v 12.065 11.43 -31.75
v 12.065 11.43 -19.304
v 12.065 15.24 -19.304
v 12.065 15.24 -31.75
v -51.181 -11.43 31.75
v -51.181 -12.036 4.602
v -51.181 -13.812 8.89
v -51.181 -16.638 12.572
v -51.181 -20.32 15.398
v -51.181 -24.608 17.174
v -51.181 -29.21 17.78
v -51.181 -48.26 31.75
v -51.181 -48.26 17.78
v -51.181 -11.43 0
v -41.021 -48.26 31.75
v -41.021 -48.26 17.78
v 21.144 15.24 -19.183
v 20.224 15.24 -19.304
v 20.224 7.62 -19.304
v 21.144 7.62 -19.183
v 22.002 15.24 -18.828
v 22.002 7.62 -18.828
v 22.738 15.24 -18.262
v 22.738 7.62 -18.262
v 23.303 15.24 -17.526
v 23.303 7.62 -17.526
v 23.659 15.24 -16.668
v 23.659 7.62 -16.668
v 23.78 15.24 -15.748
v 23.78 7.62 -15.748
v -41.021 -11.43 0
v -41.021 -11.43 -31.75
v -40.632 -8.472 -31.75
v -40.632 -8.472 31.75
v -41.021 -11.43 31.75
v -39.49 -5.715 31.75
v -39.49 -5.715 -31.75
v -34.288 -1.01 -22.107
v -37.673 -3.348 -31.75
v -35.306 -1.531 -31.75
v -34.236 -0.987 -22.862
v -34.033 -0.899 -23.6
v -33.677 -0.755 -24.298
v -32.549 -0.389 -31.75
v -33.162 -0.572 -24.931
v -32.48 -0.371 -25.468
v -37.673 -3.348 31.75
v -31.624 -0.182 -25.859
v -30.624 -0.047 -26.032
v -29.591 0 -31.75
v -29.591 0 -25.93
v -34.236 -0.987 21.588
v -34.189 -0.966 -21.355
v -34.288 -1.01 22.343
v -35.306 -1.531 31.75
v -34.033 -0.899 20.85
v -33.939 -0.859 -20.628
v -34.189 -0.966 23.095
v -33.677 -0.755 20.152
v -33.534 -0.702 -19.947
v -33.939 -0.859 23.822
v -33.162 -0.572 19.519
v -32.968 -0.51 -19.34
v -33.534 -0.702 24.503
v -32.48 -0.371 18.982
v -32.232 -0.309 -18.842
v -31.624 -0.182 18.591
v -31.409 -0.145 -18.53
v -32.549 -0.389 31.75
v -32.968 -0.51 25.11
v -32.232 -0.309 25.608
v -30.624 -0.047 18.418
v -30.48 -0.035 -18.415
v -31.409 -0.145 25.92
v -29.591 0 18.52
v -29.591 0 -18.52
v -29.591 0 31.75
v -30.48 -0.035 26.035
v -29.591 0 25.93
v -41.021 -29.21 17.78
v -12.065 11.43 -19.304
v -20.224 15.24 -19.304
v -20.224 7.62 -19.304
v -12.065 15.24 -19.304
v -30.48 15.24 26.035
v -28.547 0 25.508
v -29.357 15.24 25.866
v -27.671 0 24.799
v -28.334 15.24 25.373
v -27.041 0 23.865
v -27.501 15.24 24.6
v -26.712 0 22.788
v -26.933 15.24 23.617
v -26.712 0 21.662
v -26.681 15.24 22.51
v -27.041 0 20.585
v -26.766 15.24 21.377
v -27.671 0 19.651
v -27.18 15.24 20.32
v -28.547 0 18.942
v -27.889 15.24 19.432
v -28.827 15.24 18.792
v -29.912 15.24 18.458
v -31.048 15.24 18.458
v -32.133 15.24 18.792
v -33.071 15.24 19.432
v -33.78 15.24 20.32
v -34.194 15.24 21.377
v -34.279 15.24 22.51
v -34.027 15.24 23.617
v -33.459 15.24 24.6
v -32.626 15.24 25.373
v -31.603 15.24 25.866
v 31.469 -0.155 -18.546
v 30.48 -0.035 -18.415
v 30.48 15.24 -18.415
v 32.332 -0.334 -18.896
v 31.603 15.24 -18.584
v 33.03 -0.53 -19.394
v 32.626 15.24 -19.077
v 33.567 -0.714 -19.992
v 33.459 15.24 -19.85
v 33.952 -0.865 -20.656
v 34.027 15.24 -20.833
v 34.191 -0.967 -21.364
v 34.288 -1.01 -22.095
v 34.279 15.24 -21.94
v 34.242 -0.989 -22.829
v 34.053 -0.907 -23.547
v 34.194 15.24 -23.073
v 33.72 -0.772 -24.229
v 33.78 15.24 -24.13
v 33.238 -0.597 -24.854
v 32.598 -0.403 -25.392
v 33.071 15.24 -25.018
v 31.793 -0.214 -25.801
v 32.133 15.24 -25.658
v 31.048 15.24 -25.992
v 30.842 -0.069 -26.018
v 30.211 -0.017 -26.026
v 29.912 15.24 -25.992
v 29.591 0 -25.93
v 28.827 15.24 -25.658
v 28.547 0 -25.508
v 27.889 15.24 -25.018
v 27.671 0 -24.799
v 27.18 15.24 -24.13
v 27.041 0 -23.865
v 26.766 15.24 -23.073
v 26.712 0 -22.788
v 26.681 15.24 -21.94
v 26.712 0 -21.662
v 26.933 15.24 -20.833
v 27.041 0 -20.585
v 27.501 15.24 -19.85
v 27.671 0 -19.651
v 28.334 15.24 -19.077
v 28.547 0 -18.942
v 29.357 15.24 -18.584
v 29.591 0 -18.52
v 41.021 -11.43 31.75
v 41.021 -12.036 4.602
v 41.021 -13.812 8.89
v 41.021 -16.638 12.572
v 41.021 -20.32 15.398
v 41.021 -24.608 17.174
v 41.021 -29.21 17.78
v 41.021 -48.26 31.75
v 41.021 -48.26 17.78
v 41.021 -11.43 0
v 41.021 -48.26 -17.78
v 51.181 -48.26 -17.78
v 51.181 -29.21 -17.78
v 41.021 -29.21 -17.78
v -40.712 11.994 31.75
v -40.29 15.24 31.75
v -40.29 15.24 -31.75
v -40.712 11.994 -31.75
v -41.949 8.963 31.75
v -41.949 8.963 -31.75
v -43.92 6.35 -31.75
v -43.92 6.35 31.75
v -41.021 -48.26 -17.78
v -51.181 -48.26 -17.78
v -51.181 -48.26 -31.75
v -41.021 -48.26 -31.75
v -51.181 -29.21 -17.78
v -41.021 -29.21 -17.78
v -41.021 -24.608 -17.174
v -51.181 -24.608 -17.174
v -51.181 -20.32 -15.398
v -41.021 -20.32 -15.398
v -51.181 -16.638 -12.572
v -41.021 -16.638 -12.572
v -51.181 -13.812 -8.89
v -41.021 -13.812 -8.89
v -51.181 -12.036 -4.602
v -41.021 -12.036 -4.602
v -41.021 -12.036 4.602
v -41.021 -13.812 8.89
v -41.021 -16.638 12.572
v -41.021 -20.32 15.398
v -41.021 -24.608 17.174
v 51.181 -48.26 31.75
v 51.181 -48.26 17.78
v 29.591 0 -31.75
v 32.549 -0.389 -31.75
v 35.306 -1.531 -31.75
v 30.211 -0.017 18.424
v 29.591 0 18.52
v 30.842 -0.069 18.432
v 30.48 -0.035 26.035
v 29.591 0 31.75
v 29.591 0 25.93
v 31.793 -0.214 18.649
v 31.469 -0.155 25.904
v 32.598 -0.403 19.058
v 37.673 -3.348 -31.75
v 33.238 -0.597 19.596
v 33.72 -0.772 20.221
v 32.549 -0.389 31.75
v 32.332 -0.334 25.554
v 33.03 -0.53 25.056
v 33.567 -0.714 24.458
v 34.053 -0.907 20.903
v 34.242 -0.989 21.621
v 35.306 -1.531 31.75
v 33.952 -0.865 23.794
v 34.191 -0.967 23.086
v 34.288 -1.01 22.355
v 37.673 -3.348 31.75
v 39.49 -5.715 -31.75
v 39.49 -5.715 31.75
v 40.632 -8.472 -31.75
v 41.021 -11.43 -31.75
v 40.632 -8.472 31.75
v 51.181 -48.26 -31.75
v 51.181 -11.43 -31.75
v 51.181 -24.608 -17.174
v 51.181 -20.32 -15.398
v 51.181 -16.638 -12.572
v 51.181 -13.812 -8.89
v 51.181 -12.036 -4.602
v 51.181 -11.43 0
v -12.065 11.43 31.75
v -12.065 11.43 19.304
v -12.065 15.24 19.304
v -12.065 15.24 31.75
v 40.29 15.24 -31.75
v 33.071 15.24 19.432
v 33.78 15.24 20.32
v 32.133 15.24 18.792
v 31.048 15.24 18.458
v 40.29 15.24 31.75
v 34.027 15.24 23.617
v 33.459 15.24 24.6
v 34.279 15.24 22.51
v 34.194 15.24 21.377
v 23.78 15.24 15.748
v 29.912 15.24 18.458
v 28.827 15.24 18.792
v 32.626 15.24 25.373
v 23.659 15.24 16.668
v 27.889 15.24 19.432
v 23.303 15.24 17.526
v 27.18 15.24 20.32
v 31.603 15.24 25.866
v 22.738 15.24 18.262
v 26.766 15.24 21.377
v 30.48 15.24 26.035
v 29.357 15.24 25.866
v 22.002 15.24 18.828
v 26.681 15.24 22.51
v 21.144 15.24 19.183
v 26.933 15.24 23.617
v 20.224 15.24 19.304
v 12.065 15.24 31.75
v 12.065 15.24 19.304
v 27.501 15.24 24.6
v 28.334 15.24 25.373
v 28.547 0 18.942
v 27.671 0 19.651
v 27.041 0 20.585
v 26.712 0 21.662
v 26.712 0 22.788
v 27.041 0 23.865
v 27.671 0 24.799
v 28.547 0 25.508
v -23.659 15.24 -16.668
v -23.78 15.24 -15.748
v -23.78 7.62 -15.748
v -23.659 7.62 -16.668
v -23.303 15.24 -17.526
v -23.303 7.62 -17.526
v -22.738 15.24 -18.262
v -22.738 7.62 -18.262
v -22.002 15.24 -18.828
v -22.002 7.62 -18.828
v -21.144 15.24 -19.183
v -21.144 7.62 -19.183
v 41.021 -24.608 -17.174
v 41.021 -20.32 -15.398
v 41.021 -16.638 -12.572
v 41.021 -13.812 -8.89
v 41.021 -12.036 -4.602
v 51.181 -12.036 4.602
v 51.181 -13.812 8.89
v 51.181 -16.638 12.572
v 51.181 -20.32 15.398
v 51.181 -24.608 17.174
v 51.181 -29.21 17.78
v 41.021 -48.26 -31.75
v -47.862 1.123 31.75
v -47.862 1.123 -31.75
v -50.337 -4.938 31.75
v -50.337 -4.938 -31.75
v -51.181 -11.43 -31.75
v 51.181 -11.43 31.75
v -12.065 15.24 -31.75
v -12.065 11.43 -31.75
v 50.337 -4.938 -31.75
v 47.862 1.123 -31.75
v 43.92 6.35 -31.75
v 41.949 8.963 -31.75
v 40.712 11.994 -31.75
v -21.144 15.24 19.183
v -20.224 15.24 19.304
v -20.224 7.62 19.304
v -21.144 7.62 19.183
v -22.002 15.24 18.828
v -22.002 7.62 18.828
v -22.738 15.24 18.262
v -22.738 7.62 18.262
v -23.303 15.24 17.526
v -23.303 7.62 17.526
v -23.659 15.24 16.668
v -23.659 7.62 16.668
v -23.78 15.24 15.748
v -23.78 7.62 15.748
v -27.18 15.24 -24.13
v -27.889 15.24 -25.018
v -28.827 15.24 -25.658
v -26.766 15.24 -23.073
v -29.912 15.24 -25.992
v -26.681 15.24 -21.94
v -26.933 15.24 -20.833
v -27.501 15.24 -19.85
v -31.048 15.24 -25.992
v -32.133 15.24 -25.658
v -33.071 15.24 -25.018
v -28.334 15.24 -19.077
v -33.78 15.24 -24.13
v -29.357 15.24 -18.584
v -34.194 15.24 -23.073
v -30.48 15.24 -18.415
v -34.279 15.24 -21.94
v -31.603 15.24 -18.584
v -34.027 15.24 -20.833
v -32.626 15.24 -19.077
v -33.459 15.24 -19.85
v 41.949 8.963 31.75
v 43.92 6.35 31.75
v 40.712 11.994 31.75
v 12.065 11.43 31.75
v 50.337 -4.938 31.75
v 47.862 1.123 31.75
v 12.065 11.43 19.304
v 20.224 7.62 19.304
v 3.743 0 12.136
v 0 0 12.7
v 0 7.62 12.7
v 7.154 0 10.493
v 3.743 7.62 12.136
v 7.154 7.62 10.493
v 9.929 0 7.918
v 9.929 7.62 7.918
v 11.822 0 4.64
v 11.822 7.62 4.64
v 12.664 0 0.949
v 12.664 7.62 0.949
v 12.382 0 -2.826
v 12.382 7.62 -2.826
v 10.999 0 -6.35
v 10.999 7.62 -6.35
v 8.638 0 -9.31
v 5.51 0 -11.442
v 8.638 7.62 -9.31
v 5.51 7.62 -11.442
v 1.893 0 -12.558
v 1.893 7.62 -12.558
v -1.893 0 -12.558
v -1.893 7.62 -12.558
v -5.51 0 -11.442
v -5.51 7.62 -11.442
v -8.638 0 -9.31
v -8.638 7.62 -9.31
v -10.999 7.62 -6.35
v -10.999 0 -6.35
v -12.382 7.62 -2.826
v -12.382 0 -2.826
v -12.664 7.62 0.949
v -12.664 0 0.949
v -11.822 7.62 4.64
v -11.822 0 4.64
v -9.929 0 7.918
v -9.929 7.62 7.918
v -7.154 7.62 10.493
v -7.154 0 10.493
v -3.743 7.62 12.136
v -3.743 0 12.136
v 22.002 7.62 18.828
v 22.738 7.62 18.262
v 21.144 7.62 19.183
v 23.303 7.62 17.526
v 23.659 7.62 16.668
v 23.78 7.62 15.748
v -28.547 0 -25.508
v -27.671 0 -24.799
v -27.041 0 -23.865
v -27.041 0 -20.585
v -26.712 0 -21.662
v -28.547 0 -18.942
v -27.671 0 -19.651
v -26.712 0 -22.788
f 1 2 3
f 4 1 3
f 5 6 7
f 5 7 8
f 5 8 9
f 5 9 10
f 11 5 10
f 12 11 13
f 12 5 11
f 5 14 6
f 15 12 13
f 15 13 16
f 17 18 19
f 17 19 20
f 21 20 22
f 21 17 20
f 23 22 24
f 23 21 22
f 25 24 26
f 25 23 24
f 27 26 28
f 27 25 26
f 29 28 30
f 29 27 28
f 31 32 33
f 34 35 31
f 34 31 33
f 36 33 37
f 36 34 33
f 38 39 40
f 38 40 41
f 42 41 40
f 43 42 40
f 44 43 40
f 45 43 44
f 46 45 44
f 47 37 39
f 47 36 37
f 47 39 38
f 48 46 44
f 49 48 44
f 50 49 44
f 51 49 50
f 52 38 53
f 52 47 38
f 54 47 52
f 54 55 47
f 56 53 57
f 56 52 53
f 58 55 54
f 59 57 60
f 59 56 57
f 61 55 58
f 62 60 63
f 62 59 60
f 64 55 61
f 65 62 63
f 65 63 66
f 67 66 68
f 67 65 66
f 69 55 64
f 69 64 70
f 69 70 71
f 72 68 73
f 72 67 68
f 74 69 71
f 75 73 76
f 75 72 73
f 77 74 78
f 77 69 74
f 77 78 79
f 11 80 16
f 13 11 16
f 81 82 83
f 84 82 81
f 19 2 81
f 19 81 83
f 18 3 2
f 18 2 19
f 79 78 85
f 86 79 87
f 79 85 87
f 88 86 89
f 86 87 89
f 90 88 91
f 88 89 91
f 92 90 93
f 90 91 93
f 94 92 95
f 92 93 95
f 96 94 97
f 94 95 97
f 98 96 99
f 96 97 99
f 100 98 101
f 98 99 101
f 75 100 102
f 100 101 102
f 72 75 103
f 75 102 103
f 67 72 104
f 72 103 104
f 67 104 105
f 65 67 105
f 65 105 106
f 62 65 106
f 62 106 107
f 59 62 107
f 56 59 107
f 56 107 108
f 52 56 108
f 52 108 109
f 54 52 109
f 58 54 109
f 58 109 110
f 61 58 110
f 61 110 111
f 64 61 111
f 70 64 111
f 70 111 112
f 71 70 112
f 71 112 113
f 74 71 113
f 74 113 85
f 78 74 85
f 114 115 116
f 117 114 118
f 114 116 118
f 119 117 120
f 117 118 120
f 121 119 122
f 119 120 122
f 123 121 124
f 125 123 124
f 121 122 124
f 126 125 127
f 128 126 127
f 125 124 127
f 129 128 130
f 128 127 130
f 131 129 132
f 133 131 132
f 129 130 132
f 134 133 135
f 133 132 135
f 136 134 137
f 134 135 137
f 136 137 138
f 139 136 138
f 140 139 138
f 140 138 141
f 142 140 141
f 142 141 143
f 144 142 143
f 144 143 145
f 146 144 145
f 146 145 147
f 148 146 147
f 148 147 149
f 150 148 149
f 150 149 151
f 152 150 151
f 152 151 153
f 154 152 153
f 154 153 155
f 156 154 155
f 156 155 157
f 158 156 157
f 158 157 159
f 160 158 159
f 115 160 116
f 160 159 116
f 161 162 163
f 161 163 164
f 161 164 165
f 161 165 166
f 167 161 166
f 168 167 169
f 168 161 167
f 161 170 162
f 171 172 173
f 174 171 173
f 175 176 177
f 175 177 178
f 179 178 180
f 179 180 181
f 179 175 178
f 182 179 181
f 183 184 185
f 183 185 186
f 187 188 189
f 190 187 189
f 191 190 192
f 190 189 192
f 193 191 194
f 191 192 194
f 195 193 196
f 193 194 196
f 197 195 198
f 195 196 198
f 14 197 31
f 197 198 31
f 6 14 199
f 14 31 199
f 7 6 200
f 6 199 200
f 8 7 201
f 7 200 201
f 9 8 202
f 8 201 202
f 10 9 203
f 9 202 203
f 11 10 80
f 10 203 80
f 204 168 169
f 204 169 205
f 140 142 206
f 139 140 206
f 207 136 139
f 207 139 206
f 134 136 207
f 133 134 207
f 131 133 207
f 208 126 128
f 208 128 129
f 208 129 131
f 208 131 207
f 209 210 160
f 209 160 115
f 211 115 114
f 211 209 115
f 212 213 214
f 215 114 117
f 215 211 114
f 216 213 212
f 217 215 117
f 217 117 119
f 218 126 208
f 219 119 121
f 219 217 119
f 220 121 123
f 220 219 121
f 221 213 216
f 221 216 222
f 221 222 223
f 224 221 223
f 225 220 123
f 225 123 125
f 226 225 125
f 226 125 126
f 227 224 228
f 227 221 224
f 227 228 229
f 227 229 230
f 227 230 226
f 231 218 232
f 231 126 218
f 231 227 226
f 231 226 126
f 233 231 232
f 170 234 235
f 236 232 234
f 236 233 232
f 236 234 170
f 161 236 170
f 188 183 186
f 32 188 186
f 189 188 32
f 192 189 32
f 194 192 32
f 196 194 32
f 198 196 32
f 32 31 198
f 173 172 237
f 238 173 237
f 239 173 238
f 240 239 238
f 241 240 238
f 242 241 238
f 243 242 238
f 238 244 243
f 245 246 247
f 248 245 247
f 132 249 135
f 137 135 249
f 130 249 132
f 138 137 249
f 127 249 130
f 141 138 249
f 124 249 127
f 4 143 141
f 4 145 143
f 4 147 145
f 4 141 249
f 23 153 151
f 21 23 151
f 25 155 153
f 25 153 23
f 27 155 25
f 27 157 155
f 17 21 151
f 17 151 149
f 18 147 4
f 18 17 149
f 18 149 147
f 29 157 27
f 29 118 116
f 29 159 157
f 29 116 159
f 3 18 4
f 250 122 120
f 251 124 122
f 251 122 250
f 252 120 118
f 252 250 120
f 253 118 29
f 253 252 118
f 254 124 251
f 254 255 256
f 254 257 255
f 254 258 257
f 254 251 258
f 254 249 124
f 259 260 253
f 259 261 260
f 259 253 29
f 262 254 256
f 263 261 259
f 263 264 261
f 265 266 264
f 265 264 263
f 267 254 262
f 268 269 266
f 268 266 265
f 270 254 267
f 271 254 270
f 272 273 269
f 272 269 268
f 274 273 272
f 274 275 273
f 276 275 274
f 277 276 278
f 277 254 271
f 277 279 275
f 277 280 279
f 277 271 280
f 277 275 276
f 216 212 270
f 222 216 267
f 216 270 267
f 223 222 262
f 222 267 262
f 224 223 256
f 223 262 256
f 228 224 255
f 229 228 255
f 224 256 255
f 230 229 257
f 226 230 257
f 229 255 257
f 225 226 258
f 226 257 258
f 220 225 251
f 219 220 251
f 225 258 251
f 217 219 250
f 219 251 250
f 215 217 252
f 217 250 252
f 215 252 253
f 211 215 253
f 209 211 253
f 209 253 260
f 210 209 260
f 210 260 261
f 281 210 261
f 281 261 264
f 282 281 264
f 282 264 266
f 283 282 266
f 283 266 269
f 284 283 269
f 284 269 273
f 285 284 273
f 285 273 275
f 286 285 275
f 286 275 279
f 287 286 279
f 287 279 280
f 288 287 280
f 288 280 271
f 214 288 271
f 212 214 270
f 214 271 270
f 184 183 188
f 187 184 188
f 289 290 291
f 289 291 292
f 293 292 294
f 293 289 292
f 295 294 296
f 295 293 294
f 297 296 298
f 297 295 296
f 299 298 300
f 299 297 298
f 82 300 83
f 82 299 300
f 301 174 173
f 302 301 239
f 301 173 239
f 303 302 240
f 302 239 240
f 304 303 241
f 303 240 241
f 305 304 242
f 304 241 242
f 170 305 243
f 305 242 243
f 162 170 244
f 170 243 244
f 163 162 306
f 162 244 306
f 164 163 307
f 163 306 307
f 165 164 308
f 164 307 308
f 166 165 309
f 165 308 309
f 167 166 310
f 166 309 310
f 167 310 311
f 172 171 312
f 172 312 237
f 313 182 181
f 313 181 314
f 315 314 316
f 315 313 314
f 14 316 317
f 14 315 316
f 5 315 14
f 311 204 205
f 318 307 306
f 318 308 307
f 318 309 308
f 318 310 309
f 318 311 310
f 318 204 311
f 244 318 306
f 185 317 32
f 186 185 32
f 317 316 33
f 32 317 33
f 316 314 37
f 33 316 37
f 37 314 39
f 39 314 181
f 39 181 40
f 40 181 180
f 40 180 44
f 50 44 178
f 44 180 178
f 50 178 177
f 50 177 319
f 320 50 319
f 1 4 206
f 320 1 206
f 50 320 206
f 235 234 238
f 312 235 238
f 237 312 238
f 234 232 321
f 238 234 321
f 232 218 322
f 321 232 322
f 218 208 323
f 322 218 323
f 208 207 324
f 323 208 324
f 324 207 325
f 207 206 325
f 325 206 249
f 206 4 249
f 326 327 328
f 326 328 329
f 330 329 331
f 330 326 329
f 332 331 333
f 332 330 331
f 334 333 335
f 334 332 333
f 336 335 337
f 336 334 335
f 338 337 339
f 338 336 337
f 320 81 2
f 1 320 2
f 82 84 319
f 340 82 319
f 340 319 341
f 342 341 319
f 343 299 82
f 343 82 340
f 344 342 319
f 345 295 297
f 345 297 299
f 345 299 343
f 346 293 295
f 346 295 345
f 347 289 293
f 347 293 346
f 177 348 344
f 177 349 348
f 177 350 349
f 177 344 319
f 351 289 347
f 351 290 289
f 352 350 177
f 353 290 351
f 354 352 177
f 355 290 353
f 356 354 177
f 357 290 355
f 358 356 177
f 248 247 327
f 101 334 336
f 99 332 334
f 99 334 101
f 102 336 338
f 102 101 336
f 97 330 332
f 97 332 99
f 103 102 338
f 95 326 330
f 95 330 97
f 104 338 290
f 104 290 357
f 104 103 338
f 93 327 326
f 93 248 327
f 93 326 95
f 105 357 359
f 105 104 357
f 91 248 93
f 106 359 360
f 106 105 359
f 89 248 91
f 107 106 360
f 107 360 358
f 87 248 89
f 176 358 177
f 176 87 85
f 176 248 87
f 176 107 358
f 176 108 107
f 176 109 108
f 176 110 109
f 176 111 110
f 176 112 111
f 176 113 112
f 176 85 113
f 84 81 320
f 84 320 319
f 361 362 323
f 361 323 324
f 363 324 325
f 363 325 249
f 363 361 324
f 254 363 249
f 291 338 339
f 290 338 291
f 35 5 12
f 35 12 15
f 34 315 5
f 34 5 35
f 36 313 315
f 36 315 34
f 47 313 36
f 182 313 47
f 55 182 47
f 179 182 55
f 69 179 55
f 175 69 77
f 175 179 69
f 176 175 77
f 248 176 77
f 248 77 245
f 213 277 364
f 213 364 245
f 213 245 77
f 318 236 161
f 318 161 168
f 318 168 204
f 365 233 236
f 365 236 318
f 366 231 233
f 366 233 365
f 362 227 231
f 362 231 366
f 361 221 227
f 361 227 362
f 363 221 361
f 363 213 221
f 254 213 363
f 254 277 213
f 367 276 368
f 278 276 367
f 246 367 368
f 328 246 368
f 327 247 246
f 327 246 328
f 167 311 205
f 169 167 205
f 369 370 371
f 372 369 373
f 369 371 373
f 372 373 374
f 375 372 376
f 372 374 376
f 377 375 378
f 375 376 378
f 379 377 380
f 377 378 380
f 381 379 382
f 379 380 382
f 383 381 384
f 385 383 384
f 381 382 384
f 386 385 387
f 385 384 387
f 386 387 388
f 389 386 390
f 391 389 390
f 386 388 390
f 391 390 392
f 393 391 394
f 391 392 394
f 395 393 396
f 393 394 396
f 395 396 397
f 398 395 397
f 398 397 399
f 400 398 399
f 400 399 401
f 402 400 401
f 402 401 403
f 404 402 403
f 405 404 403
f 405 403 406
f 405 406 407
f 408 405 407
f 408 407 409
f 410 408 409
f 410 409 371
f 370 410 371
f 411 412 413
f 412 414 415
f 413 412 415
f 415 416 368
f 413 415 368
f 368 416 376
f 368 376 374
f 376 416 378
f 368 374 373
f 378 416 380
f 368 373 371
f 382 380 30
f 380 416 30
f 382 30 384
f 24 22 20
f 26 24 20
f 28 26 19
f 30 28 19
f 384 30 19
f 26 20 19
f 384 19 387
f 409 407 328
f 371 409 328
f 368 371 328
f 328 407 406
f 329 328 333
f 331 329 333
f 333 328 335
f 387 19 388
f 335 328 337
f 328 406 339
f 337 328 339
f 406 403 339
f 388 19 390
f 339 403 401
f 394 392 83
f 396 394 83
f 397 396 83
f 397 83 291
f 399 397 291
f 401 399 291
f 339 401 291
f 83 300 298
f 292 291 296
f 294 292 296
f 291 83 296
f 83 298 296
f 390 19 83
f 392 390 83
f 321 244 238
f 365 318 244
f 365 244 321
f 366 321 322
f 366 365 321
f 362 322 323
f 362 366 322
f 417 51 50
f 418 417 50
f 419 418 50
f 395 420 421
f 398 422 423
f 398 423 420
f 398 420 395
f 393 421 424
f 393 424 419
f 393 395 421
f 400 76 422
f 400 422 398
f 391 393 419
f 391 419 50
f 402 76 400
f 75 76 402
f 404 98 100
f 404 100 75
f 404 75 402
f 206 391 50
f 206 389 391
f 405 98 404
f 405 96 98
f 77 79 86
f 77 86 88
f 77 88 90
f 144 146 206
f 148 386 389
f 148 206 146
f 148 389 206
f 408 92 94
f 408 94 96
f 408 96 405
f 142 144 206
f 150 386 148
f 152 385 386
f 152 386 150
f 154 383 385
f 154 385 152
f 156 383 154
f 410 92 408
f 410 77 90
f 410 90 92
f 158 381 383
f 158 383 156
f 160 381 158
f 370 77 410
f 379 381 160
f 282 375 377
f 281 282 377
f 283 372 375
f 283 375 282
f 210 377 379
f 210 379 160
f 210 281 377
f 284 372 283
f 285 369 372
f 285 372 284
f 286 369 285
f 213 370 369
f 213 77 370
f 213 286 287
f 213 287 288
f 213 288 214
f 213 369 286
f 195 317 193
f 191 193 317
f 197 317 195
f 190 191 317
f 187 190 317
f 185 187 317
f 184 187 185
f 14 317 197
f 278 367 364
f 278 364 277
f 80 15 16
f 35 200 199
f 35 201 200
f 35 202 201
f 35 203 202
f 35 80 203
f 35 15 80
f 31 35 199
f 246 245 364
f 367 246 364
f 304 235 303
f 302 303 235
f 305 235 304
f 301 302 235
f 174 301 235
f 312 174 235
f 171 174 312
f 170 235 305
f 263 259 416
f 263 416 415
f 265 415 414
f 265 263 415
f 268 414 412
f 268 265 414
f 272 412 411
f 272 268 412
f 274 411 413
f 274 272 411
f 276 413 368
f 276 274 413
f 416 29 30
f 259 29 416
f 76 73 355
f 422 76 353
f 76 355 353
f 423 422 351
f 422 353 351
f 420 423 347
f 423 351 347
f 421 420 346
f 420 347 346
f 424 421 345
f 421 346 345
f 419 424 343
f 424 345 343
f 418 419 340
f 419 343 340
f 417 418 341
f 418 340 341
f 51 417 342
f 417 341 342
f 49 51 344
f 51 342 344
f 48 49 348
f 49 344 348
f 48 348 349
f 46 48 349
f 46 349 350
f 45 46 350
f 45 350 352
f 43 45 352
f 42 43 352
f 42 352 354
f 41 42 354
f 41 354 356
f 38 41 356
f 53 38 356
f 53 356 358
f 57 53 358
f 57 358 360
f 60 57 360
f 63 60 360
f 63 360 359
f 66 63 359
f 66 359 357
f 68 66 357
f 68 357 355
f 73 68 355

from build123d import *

# Parameters (mm, degrees)
BOSS_EXTRUDE1_DEPTH = 31.75
CUT_EXTRUDE1_DEPTH  = 118.537522281
CUT_EXTRUDE2_DEPTH  = 7.62
SKETCH5_W           = 24.13
SKETCH5_H           = 3.81
CUT_EXTRUDE3_DEPTH  = 95.766937067
CUT_EXTRUDE4_REACH  = 84.159
SKETCH6_R           = 12.7
CUT_EXTRUDE5_REACH  = 89.52
SKETCH7_R           = 3.81


with BuildPart() as part:
    # Sketch2 → Boss-Extrude1 (new, symmetric)
    with BuildSketch(Plane.XY):
        with BuildLine():
            Line((-29.591, 0), (29.591, 0))
            ThreePointArc((29.591, 0), (37.673230509, -3.347769491), (41.021, -11.43))
            Line((41.021, -11.43), (41.021, -48.26))
            Line((41.021, -48.26), (51.181, -48.26))
            Line((51.181, -48.26), (51.181, -11.43))
            ThreePointArc((51.181, -11.43), (49.29585059, -1.827302371), (43.920228208, 6.35))
            ThreePointArc((43.920228208, 6.35), (41.232417018, 10.438651186), (40.289842313, 15.24))
            Line((40.289842313, 15.24), (-40.289842313, 15.24))
            ThreePointArc((-40.289842313, 15.24), (-41.232417018, 10.438651186), (-43.920228208, 6.35))
            ThreePointArc((-43.920228208, 6.35), (-49.29585059, -1.827302371), (-51.181, -11.43))
            Line((-51.181, -11.43), (-51.181, -48.26))
            Line((-51.181, -48.26), (-41.021, -48.26))
            Line((-41.021, -48.26), (-41.021, -11.43))
            ThreePointArc((-41.021, -11.43), (-37.673230509, -3.347769491), (-29.591, 0))
        make_face()
    extrude(amount=BOSS_EXTRUDE1_DEPTH, both=True)

    # Sketch3 → Cut-Extrude1 (cut, through all)
    with BuildSketch(Plane(origin=(51.181, 0, 0), x_dir=(0, 0, -1), z_dir=(1, 0, 0))):
        with BuildLine():
            Line((-17.78, -48.26), (17.78, -48.26))
            Line((17.78, -48.26), (17.78, -29.21))
            ThreePointArc((17.78, -29.21), (0, -11.43), (-17.78, -29.21))
            Line((-17.78, -29.21), (-17.78, -48.26))
        make_face()
    extrude(amount=-CUT_EXTRUDE1_DEPTH, mode=Mode.SUBTRACT)

    # Sketch4 → Cut-Extrude2 (cut)
    with BuildSketch(Plane(origin=(0, 15.24, 0), x_dir=(1, 0, 0), z_dir=(0, 1, 0))):
        with BuildLine():
            Line((-20.223842313, 19.304), (20.223842313, 19.304))
            ThreePointArc((20.223842313, 19.304), (22.738314027, 18.262471714), (23.779842313, 15.748))
            Line((23.779842313, 15.748), (23.779842313, -15.748))
            ThreePointArc((23.779842313, -15.748), (22.738314027, -18.262471714), (20.223842313, -19.304))
            Line((20.223842313, -19.304), (-20.223842313, -19.304))
            ThreePointArc((-20.223842313, -19.304), (-22.738314027, -18.262471714), (-23.779842313, -15.748))
            Line((-23.779842313, -15.748), (-23.779842313, 15.748))
            ThreePointArc((-23.779842313, 15.748), (-22.738314027, 18.262471714), (-20.223842313, 19.304))
        make_face()
    extrude(amount=-CUT_EXTRUDE2_DEPTH, mode=Mode.SUBTRACT)

    # Sketch5 → Cut-Extrude3 (cut, through all)
    with BuildSketch(Plane.XY.offset(31.75)):
        with Locations((0, 13.335)):
            Rectangle(SKETCH5_W, SKETCH5_H)
    extrude(amount=-CUT_EXTRUDE3_DEPTH, mode=Mode.SUBTRACT)

    # Sketch6 → Cut-Extrude4 (cut, up to next)
    with BuildSketch(Plane(origin=(0, 7.62, 0), x_dir=(1, 0, 0), z_dir=(0, 1, 0)), mode=Mode.PRIVATE) as cut_extrude4_sk1:
        with Locations(Location((0, 0, 0), (0, 0, 270))):
            Circle(SKETCH6_R)
    cut_extrude4_tool1 = extrude(cut_extrude4_sk1.sketch, amount=-CUT_EXTRUDE4_REACH, mode=Mode.PRIVATE) & part.part
    add(cut_extrude4_tool1.solids().sort_by_distance((0, 7.62, 0))[0], mode=Mode.SUBTRACT)

    # Sketch7 → Cut-Extrude5 (cut, up to next)
    with BuildSketch(Plane(origin=(0, 15.24, 0), x_dir=(1, 0, 0), z_dir=(0, 1, 0)), mode=Mode.PRIVATE) as cut_extrude5_sk1:
        with Locations(Location((-30.48, 22.225, 0), (0, 0, 270))):
            Circle(SKETCH7_R)
    cut_extrude5_tool1 = extrude(cut_extrude5_sk1.sketch, amount=-CUT_EXTRUDE5_REACH, mode=Mode.PRIVATE) & part.part
    # Sketch7 → Cut-Extrude5 (cut, up to next)
    with BuildSketch(Plane(origin=(0, 15.24, 0), x_dir=(1, 0, 0), z_dir=(0, 1, 0)), mode=Mode.PRIVATE) as cut_extrude5_sk2:
        with Locations(Location((30.48, 22.225, 0), (0, 0, 270))):
            Circle(SKETCH7_R)
    cut_extrude5_tool2 = extrude(cut_extrude5_sk2.sketch, amount=-CUT_EXTRUDE5_REACH, mode=Mode.PRIVATE) & part.part
    # Sketch7 → Cut-Extrude5 (cut, up to next)
    with BuildSketch(Plane(origin=(0, 15.24, 0), x_dir=(1, 0, 0), z_dir=(0, 1, 0)), mode=Mode.PRIVATE) as cut_extrude5_sk3:
        with Locations(Location((30.48, -22.225, 0), (0, 0, 270))):
            Circle(SKETCH7_R)
    cut_extrude5_tool3 = extrude(cut_extrude5_sk3.sketch, amount=-CUT_EXTRUDE5_REACH, mode=Mode.PRIVATE) & part.part
    # Sketch7 → Cut-Extrude5 (cut, up to next)
    with BuildSketch(Plane(origin=(0, 15.24, 0), x_dir=(1, 0, 0), z_dir=(0, 1, 0)), mode=Mode.PRIVATE) as cut_extrude5_sk4:
        with Locations(Location((-30.48, -22.225, 0), (0, 0, 270))):
            Circle(SKETCH7_R)
    cut_extrude5_tool4 = extrude(cut_extrude5_sk4.sketch, amount=-CUT_EXTRUDE5_REACH, mode=Mode.PRIVATE) & part.part
    add(cut_extrude5_tool1.solids().sort_by_distance((-30.48, 15.24, -22.225))[0], mode=Mode.SUBTRACT)
    add(cut_extrude5_tool2.solids().sort_by_distance((30.48, 15.24, -22.225))[0], mode=Mode.SUBTRACT)
    add(cut_extrude5_tool3.solids().sort_by_distance((30.48, 15.24, 22.225))[0], mode=Mode.SUBTRACT)
    add(cut_extrude5_tool4.solids().sort_by_distance((-30.48, 15.24, 22.225))[0], mode=Mode.SUBTRACT)


solid = part.part
